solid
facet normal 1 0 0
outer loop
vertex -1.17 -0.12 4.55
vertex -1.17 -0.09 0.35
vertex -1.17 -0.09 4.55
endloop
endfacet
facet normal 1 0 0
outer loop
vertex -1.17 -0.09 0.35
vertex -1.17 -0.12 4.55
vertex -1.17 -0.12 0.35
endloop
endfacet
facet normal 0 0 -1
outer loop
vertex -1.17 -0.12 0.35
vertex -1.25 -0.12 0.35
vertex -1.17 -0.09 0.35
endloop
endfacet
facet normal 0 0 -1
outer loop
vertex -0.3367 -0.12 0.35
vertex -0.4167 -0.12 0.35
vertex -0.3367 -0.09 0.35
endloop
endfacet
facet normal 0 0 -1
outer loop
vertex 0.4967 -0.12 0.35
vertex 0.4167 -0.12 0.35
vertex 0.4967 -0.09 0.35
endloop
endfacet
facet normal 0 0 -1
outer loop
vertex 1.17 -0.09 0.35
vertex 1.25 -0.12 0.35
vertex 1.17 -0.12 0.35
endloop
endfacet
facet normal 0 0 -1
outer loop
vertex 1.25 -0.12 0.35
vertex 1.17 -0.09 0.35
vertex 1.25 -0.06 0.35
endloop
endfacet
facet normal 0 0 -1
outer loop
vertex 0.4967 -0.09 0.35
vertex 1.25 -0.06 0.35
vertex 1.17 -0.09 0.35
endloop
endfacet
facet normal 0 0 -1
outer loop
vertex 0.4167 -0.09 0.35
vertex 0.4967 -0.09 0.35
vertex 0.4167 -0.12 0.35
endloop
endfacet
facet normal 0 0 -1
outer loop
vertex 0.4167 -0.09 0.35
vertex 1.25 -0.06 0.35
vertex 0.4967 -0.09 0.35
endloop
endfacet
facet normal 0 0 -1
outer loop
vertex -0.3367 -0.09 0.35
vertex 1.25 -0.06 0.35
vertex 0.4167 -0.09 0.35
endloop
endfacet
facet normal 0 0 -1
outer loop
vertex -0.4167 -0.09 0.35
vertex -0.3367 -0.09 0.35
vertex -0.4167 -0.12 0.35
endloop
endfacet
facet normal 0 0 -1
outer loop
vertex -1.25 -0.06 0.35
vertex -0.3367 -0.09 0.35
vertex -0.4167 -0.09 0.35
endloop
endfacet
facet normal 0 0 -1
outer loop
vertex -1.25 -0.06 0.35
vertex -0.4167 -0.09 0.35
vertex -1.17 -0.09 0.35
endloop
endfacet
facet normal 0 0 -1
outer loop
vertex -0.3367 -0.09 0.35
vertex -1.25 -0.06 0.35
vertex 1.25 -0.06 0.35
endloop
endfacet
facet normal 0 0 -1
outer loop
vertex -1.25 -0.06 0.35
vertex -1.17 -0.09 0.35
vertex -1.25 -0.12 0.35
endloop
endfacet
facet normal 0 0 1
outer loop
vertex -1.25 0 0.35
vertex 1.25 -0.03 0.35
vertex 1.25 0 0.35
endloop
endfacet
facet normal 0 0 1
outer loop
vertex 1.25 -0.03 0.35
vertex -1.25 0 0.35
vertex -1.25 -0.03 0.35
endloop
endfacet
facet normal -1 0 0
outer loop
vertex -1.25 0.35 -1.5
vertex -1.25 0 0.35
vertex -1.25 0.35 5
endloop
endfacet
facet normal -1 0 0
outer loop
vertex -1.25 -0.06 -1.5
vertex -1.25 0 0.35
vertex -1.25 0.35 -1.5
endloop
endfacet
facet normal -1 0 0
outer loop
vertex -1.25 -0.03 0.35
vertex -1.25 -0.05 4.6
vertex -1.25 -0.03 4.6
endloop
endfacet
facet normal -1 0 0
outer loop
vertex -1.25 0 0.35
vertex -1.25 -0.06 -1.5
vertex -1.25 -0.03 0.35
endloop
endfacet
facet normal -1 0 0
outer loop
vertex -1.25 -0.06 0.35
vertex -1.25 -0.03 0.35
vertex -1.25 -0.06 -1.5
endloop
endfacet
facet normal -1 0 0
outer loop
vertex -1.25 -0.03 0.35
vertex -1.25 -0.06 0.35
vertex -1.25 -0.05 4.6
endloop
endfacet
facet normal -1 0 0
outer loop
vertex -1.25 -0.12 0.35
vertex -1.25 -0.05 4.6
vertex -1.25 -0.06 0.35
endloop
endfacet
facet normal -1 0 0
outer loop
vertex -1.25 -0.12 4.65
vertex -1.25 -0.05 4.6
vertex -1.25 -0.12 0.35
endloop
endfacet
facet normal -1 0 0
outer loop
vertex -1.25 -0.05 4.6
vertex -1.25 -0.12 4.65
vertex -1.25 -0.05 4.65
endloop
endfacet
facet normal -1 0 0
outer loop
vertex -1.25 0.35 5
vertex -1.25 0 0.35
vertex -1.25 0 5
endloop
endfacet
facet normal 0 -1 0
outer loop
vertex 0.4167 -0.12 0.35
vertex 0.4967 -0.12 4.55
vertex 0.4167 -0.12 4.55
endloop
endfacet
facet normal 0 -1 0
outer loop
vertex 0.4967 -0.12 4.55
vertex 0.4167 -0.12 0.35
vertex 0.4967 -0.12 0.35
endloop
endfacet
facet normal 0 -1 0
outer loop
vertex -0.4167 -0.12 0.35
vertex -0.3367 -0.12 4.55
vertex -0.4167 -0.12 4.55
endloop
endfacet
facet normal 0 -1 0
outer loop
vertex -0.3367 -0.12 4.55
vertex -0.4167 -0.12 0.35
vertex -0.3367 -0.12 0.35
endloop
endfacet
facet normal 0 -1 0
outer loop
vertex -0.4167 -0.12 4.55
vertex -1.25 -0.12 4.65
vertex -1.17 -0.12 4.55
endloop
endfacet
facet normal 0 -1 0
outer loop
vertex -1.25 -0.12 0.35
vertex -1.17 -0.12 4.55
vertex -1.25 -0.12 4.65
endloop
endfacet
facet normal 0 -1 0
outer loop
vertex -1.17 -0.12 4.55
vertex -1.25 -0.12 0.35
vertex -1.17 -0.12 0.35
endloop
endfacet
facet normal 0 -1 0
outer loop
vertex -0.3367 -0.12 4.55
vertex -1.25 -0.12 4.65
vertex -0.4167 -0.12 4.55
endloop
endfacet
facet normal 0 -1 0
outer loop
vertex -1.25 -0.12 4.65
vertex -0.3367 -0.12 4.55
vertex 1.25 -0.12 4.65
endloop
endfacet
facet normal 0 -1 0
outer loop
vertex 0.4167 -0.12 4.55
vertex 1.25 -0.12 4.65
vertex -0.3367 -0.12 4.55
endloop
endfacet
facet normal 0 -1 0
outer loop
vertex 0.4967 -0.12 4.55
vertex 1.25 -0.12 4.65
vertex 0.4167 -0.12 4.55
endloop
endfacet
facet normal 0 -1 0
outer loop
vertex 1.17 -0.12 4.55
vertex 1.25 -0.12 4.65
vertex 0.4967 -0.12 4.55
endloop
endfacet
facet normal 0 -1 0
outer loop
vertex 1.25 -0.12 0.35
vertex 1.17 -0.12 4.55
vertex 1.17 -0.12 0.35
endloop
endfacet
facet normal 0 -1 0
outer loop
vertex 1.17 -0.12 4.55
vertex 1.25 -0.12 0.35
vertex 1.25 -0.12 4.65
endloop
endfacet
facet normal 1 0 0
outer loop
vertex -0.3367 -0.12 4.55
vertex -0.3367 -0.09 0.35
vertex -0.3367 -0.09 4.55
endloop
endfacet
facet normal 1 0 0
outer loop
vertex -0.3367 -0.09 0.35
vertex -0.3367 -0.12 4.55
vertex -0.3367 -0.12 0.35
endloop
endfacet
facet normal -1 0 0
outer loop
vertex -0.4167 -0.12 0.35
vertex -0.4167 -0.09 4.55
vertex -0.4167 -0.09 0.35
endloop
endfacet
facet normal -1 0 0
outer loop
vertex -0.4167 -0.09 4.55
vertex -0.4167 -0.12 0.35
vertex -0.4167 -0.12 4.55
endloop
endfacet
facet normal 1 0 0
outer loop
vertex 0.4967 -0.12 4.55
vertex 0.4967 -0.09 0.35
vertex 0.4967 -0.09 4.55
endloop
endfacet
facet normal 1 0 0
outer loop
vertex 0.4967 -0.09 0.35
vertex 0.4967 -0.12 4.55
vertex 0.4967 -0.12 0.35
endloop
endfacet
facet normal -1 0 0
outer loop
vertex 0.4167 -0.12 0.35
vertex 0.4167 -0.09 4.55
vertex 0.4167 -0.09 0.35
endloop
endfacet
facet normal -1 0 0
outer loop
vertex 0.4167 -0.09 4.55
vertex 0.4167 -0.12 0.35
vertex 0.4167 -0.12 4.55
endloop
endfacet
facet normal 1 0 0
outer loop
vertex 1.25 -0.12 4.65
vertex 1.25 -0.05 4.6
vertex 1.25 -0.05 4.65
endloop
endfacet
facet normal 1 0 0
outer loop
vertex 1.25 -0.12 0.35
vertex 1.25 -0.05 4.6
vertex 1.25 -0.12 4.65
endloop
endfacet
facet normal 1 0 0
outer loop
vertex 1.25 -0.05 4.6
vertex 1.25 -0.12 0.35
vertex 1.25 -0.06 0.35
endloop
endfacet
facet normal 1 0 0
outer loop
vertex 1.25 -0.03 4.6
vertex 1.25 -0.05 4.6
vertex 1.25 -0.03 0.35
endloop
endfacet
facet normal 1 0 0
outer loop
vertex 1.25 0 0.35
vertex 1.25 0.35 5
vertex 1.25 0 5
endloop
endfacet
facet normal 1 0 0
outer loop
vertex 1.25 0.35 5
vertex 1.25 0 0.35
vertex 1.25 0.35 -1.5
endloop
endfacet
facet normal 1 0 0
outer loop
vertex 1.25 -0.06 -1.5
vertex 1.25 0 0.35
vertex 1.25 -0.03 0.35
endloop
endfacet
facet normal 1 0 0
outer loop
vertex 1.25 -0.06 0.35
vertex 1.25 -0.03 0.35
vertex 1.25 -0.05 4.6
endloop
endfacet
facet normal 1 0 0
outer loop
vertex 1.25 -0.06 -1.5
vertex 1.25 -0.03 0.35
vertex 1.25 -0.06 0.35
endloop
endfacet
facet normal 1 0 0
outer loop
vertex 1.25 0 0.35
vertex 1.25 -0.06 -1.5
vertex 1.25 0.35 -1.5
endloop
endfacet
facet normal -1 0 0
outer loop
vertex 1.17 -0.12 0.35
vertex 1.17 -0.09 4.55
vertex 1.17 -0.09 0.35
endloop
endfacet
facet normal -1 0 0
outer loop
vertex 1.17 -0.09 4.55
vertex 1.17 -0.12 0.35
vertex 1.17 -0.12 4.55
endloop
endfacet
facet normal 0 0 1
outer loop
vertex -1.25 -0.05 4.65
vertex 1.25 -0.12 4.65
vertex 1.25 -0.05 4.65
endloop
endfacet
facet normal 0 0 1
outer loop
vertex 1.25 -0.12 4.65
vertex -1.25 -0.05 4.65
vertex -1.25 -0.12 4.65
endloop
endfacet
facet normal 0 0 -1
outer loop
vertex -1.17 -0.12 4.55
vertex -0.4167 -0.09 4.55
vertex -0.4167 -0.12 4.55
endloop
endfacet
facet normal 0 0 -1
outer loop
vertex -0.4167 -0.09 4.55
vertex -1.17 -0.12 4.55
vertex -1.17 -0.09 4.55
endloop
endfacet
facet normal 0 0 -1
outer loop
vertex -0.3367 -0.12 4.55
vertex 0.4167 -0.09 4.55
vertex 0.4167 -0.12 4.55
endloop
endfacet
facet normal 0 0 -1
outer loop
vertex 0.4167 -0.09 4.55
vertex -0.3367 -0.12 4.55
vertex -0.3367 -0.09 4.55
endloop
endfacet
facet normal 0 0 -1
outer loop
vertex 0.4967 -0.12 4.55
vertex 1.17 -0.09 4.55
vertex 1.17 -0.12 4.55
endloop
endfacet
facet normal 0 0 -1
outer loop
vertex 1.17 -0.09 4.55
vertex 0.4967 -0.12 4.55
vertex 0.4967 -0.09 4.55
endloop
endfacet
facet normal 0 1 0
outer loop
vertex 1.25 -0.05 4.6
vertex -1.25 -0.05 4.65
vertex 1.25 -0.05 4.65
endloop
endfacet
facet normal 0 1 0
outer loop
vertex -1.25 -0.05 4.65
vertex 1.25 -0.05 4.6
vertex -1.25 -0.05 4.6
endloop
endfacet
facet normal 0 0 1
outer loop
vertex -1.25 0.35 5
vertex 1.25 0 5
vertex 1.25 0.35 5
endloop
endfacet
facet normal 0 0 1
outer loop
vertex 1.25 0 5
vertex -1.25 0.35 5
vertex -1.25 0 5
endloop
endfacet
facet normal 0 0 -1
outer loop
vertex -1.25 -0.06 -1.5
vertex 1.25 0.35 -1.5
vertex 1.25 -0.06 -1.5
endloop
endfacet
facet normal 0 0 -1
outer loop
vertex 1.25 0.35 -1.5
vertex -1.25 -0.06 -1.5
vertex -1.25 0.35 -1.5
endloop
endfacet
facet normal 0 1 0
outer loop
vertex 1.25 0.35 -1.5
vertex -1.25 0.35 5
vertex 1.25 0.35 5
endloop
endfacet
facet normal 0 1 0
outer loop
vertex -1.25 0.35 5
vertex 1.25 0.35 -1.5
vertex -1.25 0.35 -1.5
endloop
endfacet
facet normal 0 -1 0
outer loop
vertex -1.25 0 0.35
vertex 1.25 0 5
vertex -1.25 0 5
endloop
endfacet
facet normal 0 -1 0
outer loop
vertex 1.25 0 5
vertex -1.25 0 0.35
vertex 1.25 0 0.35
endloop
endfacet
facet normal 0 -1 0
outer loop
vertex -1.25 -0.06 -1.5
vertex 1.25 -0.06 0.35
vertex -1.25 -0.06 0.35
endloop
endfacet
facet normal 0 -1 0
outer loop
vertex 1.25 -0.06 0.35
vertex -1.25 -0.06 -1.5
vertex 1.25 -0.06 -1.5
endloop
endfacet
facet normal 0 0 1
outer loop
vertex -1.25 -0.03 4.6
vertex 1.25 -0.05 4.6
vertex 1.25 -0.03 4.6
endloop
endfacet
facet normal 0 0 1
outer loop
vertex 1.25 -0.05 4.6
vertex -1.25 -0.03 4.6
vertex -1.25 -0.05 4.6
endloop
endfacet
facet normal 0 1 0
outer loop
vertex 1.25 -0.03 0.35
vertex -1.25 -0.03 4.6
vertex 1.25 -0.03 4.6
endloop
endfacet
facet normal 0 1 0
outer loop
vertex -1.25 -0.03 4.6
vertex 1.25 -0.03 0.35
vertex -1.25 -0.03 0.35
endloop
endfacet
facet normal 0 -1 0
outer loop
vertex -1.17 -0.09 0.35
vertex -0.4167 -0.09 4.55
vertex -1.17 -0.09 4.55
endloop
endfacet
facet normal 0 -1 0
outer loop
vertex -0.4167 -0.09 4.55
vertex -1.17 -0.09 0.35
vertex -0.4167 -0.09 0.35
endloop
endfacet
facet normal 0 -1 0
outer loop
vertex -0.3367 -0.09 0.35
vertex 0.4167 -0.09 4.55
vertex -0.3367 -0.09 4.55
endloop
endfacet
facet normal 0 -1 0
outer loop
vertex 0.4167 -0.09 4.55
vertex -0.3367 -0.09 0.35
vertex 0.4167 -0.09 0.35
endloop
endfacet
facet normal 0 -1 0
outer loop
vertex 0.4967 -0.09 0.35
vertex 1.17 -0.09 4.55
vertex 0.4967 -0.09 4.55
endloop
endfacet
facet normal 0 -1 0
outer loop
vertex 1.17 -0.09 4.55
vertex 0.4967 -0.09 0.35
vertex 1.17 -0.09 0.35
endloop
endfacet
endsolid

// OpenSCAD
// file: lib/lodge_kit.scad
// Lodge shell tile kit — shared dimensions and modules.
//
// The game paints a lodge footprint in 5 m cells and resolves the
// exterior from these tiles at half-cell (2.5 m) resolution; see
// internal/world/lodge_shell.go. Every tile is authored in the same
// canonical frame:
//
//   * origin on the lodge floor plane (Z = 0);
//   * wall-type tiles sit on a footprint edge, centred on it, with the
//     OUTSIDE toward SCAD −Y (game +Z) and the wall thickness toward +Y;
//   * roof tiles are centred on a half-cell, with Z = 0 at the tile's
//     lowest corner; slopes fall toward −Y (game +Z);
//   * corner tiles sit on a grid vertex; an outer corner's building is
//     in the SCAD (−X, +Y) quadrant, an inner corner's notch in (+X, −Y).
//
// Colours are near-neutral: the renderer tints walls and roofs per lodge
// from a seeded palette (world.ShellPalette).
//
// Keep these in sync with the constants in lodge_shell.go.

tile   = 2.5;   // ShellTileSize
wall_h = 5.0;   // ShellWallHeight
rise   = 2.1;   // ShellRoofRise, per tile of run
pitch  = rise / tile;

wall_t   = 0.35;  // wall thickness
sink     = 1.5;   // walls run this far below the floor to hide pad grading
roof_t   = 0.25;  // roof slab thickness
overhang = 0.7;   // eaves overhang past the wall plane

c_wall   = [0.92, 0.90, 0.86];
c_stone  = [0.62, 0.61, 0.60];
c_trim   = [0.97, 0.97, 0.95];
c_glass  = [0.30, 0.42, 0.52];
c_door   = [0.36, 0.25, 0.18];
c_roof   = [0.97, 0.97, 0.97];
c_fascia = [0.55, 0.52, 0.50];

// Plain wall panel: timber above a stone plinth, a trim band under the
// eaves.
module wall_panel() {
    color(c_wall)
        translate([-tile/2, 0, -sink]) cube([tile, wall_t, wall_h + sink]);
    color(c_stone)
        translate([-tile/2, -0.06, -sink]) cube([tile, wall_t, sink + 0.7]);
    color(c_trim)
        translate([-tile/2, -0.04, wall_h - 0.3]) cube([tile, 0.1, 0.3]);
    battens();
}

// Horizontal board lines above the plinth.
module battens() {
    color(c_wall * 0.8)
        for (z = [1.3 : 0.6 : wall_h - 0.6])
            translate([-tile/2, -0.03, z]) cube([tile, 0.04, 0.06]);
}

// A framed pane on the outer face. x0/w along the wall, z0/h up it.
module pane(x0, w, z0, h) {
    color(c_trim)
        translate([x0 - 0.1, -0.05, z0 - 0.1]) cube([w + 0.2, 0.06, h + 0.2]);
    color(c_glass)
        translate([x0, -0.08, z0]) cube([w, 0.06, h]);
}

module wall_window() {
    wall_panel();
    pane(-0.7, 1.4, 1.4, 2.2);
    color(c_trim) translate([-0.02, -0.1, 1.4]) cube([0.04, 0.04, 2.2]); // mullion
}

// Tall window flanked by shutters.
module wall_window_alt() {
    wall_panel();
    pane(-0.5, 1.0, 1.2, 2.8);
    color(c_door) {
        translate([-1.0, -0.1, 1.2]) cube([0.4, 0.05, 2.8]);
        translate([ 0.6, -0.1, 1.2]) cube([0.4, 0.05, 2.8]);
    }
}

// Floor-to-eave glazing for food courts: a low stone sill, then glass in
// three lights.
module wall_glazed() {
    color(c_wall)
        translate([-tile/2, 0, -sink]) cube([tile, wall_t, wall_h + sink]);
    color(c_stone)
        translate([-tile/2, -0.06, -sink]) cube([tile, wall_t, sink + 0.35]);
    color(c_glass)
        translate([-tile/2, -0.09, 0.35]) cube([tile, 0.06, wall_h - 0.75]);
    color(c_trim) {
        for (x = [-tile/2, -tile/6, tile/6, tile/2 - 0.08])
            translate([x, -0.12, 0.35]) cube([0.08, 0.06, wall_h - 0.75]);
        translate([-tile/2, -0.12, wall_h - 0.45]) cube([tile, 0.07, 0.1]);
    }
}

// Glazed entry door under a small canopy, with a step.
module door() {
    color(c_wall)
        translate([-tile/2, 0, -sink]) cube([tile, wall_t, wall_h + sink]);
    color(c_stone)
        translate([-tile/2, -0.06, -sink]) cube([tile, wall_t, sink + 0.15]);
    battens();
    color(c_door)
        translate([-0.9, -0.1, 0]) cube([1.8, 0.1, 2.7]);
    color(c_glass) {
        translate([-0.75, -0.13, 0.9]) cube([0.65, 0.05, 1.6]);
        translate([ 0.10, -0.13, 0.9]) cube([0.65, 0.05, 1.6]);
    }
    color(c_trim)
        translate([-tile/2, -0.04, wall_h - 0.3]) cube([tile, 0.1, 0.3]);
    color(c_roof)   // canopy
        translate([-1.2, -1.3, 3.0])
            rotate([-12, 0, 0]) cube([2.4, 1.3, 0.12]);
    color(c_stone)  // step
        translate([-1.1, -0.9, -0.3]) cube([2.2, 0.9, 0.42]);
}

module corner_outer() {
    color(c_stone)
        translate([-0.3, -0.05, -sink]) cube([0.35, 0.35, wall_h + sink - 0.3]);
}

module corner_inner() {
    color(c_trim)
        translate([0, -0.12, 0]) cube([0.12, 0.12, wall_h - 0.3]);
}

// Roof slab over one half-cell. h lists corner heights (in rise units)
// in SCAD order (−X,+Y), (+X,+Y), (+X,−Y), (−X,−Y); split names which
// diagonal the top surface folds along: 0 through corners 0–2, 1
// through corners 1–3.
module roof_tile(h, split) {
    p = [[-tile/2, tile/2], [tile/2, tile/2], [tile/2, -tile/2], [-tile/2, -tile/2]];
    top = [for (i = [0:3]) [p[i][0], p[i][1], h[i] * rise]];
    bot = [for (i = [0:3]) [p[i][0], p[i][1], h[i] * rise - roof_t]];
    tris = split == 0 ? [[0, 1, 2], [0, 2, 3]] : [[0, 1, 3], [1, 2, 3]];
    color(c_roof)
        polyhedron(
            points = concat(top, bot),
            faces = concat(
                // top (clockwise seen from above = outward in OpenSCAD)
                [for (t = tris) [t[0], t[1], t[2]]],
                [for (t = tris) [t[2] + 4, t[1] + 4, t[0] + 4]],
                [for (i = [0:3]) [i, i + 4, (i + 1) % 4 + 4, (i + 1) % 4]]
            ));
}

// Eaves strip past a wall edge: continues the roof plane outward and
// down, finished with a fascia board.
module eave() {
    drop = overhang * pitch;
    color(c_roof)
        polyhedron(
            points = [
                [-tile/2, 0, 0], [tile/2, 0, 0], [tile/2, -overhang, -drop], [-tile/2, -overhang, -drop],
                [-tile/2, 0, -roof_t], [tile/2, 0, -roof_t], [tile/2, -overhang, -drop - roof_t], [-tile/2, -overhang, -drop - roof_t],
            ],
            faces = [[0, 1, 2, 3], [7, 6, 5, 4], [0, 4, 5, 1], [1, 5, 6, 2], [2, 6, 7, 3], [3, 7, 4, 0]]);
    color(c_fascia)
        translate([-tile/2, -overhang - 0.05, -drop - roof_t - 0.1]) cube([tile, 0.08, roof_t + 0.2]);
}

// Eaves in the square past an outer corner: a hip folding along the
// diagonal away from the building.
module eave_corner() {
    o = overhang;
    d = o * pitch;
    color(c_roof)
        polyhedron(
            points = [
                [0, 0, 0], [o, 0, -d], [o, -o, -d], [0, -o, -d],
                [0, 0, -roof_t], [o, 0, -d - roof_t], [o, -o, -d - roof_t], [0, -o, -d - roof_t],
            ],
            faces = [[0, 1, 2], [0, 2, 3], [6, 5, 4], [7, 6, 4], [0, 4, 5, 1], [1, 5, 6, 2], [2, 6, 7, 3], [3, 7, 4, 0]]);
    color(c_fascia) {
        translate([0, -o - 0.05, -d - roof_t - 0.1]) cube([o + 0.05, 0.08, roof_t + 0.2]);
        translate([o - 0.03, -o - 0.05, -d - roof_t - 0.1]) cube([0.08, o + 0.05, roof_t + 0.2]);
    }
}

module chimney() {
    color(c_stone)
        translate([-0.55, -0.55, -1.0]) cube([1.1, 1.1, rise + 3.0]);
    color(c_fascia)
        translate([-0.65, -0.65, rise + 1.8]) cube([1.3, 1.3, 0.2]);
}
// main file
// Lodge shell kit: glazed wall (food courts). See lib/lodge_kit.scad.
include <lib/lodge_kit.scad>
wall_glazed();
